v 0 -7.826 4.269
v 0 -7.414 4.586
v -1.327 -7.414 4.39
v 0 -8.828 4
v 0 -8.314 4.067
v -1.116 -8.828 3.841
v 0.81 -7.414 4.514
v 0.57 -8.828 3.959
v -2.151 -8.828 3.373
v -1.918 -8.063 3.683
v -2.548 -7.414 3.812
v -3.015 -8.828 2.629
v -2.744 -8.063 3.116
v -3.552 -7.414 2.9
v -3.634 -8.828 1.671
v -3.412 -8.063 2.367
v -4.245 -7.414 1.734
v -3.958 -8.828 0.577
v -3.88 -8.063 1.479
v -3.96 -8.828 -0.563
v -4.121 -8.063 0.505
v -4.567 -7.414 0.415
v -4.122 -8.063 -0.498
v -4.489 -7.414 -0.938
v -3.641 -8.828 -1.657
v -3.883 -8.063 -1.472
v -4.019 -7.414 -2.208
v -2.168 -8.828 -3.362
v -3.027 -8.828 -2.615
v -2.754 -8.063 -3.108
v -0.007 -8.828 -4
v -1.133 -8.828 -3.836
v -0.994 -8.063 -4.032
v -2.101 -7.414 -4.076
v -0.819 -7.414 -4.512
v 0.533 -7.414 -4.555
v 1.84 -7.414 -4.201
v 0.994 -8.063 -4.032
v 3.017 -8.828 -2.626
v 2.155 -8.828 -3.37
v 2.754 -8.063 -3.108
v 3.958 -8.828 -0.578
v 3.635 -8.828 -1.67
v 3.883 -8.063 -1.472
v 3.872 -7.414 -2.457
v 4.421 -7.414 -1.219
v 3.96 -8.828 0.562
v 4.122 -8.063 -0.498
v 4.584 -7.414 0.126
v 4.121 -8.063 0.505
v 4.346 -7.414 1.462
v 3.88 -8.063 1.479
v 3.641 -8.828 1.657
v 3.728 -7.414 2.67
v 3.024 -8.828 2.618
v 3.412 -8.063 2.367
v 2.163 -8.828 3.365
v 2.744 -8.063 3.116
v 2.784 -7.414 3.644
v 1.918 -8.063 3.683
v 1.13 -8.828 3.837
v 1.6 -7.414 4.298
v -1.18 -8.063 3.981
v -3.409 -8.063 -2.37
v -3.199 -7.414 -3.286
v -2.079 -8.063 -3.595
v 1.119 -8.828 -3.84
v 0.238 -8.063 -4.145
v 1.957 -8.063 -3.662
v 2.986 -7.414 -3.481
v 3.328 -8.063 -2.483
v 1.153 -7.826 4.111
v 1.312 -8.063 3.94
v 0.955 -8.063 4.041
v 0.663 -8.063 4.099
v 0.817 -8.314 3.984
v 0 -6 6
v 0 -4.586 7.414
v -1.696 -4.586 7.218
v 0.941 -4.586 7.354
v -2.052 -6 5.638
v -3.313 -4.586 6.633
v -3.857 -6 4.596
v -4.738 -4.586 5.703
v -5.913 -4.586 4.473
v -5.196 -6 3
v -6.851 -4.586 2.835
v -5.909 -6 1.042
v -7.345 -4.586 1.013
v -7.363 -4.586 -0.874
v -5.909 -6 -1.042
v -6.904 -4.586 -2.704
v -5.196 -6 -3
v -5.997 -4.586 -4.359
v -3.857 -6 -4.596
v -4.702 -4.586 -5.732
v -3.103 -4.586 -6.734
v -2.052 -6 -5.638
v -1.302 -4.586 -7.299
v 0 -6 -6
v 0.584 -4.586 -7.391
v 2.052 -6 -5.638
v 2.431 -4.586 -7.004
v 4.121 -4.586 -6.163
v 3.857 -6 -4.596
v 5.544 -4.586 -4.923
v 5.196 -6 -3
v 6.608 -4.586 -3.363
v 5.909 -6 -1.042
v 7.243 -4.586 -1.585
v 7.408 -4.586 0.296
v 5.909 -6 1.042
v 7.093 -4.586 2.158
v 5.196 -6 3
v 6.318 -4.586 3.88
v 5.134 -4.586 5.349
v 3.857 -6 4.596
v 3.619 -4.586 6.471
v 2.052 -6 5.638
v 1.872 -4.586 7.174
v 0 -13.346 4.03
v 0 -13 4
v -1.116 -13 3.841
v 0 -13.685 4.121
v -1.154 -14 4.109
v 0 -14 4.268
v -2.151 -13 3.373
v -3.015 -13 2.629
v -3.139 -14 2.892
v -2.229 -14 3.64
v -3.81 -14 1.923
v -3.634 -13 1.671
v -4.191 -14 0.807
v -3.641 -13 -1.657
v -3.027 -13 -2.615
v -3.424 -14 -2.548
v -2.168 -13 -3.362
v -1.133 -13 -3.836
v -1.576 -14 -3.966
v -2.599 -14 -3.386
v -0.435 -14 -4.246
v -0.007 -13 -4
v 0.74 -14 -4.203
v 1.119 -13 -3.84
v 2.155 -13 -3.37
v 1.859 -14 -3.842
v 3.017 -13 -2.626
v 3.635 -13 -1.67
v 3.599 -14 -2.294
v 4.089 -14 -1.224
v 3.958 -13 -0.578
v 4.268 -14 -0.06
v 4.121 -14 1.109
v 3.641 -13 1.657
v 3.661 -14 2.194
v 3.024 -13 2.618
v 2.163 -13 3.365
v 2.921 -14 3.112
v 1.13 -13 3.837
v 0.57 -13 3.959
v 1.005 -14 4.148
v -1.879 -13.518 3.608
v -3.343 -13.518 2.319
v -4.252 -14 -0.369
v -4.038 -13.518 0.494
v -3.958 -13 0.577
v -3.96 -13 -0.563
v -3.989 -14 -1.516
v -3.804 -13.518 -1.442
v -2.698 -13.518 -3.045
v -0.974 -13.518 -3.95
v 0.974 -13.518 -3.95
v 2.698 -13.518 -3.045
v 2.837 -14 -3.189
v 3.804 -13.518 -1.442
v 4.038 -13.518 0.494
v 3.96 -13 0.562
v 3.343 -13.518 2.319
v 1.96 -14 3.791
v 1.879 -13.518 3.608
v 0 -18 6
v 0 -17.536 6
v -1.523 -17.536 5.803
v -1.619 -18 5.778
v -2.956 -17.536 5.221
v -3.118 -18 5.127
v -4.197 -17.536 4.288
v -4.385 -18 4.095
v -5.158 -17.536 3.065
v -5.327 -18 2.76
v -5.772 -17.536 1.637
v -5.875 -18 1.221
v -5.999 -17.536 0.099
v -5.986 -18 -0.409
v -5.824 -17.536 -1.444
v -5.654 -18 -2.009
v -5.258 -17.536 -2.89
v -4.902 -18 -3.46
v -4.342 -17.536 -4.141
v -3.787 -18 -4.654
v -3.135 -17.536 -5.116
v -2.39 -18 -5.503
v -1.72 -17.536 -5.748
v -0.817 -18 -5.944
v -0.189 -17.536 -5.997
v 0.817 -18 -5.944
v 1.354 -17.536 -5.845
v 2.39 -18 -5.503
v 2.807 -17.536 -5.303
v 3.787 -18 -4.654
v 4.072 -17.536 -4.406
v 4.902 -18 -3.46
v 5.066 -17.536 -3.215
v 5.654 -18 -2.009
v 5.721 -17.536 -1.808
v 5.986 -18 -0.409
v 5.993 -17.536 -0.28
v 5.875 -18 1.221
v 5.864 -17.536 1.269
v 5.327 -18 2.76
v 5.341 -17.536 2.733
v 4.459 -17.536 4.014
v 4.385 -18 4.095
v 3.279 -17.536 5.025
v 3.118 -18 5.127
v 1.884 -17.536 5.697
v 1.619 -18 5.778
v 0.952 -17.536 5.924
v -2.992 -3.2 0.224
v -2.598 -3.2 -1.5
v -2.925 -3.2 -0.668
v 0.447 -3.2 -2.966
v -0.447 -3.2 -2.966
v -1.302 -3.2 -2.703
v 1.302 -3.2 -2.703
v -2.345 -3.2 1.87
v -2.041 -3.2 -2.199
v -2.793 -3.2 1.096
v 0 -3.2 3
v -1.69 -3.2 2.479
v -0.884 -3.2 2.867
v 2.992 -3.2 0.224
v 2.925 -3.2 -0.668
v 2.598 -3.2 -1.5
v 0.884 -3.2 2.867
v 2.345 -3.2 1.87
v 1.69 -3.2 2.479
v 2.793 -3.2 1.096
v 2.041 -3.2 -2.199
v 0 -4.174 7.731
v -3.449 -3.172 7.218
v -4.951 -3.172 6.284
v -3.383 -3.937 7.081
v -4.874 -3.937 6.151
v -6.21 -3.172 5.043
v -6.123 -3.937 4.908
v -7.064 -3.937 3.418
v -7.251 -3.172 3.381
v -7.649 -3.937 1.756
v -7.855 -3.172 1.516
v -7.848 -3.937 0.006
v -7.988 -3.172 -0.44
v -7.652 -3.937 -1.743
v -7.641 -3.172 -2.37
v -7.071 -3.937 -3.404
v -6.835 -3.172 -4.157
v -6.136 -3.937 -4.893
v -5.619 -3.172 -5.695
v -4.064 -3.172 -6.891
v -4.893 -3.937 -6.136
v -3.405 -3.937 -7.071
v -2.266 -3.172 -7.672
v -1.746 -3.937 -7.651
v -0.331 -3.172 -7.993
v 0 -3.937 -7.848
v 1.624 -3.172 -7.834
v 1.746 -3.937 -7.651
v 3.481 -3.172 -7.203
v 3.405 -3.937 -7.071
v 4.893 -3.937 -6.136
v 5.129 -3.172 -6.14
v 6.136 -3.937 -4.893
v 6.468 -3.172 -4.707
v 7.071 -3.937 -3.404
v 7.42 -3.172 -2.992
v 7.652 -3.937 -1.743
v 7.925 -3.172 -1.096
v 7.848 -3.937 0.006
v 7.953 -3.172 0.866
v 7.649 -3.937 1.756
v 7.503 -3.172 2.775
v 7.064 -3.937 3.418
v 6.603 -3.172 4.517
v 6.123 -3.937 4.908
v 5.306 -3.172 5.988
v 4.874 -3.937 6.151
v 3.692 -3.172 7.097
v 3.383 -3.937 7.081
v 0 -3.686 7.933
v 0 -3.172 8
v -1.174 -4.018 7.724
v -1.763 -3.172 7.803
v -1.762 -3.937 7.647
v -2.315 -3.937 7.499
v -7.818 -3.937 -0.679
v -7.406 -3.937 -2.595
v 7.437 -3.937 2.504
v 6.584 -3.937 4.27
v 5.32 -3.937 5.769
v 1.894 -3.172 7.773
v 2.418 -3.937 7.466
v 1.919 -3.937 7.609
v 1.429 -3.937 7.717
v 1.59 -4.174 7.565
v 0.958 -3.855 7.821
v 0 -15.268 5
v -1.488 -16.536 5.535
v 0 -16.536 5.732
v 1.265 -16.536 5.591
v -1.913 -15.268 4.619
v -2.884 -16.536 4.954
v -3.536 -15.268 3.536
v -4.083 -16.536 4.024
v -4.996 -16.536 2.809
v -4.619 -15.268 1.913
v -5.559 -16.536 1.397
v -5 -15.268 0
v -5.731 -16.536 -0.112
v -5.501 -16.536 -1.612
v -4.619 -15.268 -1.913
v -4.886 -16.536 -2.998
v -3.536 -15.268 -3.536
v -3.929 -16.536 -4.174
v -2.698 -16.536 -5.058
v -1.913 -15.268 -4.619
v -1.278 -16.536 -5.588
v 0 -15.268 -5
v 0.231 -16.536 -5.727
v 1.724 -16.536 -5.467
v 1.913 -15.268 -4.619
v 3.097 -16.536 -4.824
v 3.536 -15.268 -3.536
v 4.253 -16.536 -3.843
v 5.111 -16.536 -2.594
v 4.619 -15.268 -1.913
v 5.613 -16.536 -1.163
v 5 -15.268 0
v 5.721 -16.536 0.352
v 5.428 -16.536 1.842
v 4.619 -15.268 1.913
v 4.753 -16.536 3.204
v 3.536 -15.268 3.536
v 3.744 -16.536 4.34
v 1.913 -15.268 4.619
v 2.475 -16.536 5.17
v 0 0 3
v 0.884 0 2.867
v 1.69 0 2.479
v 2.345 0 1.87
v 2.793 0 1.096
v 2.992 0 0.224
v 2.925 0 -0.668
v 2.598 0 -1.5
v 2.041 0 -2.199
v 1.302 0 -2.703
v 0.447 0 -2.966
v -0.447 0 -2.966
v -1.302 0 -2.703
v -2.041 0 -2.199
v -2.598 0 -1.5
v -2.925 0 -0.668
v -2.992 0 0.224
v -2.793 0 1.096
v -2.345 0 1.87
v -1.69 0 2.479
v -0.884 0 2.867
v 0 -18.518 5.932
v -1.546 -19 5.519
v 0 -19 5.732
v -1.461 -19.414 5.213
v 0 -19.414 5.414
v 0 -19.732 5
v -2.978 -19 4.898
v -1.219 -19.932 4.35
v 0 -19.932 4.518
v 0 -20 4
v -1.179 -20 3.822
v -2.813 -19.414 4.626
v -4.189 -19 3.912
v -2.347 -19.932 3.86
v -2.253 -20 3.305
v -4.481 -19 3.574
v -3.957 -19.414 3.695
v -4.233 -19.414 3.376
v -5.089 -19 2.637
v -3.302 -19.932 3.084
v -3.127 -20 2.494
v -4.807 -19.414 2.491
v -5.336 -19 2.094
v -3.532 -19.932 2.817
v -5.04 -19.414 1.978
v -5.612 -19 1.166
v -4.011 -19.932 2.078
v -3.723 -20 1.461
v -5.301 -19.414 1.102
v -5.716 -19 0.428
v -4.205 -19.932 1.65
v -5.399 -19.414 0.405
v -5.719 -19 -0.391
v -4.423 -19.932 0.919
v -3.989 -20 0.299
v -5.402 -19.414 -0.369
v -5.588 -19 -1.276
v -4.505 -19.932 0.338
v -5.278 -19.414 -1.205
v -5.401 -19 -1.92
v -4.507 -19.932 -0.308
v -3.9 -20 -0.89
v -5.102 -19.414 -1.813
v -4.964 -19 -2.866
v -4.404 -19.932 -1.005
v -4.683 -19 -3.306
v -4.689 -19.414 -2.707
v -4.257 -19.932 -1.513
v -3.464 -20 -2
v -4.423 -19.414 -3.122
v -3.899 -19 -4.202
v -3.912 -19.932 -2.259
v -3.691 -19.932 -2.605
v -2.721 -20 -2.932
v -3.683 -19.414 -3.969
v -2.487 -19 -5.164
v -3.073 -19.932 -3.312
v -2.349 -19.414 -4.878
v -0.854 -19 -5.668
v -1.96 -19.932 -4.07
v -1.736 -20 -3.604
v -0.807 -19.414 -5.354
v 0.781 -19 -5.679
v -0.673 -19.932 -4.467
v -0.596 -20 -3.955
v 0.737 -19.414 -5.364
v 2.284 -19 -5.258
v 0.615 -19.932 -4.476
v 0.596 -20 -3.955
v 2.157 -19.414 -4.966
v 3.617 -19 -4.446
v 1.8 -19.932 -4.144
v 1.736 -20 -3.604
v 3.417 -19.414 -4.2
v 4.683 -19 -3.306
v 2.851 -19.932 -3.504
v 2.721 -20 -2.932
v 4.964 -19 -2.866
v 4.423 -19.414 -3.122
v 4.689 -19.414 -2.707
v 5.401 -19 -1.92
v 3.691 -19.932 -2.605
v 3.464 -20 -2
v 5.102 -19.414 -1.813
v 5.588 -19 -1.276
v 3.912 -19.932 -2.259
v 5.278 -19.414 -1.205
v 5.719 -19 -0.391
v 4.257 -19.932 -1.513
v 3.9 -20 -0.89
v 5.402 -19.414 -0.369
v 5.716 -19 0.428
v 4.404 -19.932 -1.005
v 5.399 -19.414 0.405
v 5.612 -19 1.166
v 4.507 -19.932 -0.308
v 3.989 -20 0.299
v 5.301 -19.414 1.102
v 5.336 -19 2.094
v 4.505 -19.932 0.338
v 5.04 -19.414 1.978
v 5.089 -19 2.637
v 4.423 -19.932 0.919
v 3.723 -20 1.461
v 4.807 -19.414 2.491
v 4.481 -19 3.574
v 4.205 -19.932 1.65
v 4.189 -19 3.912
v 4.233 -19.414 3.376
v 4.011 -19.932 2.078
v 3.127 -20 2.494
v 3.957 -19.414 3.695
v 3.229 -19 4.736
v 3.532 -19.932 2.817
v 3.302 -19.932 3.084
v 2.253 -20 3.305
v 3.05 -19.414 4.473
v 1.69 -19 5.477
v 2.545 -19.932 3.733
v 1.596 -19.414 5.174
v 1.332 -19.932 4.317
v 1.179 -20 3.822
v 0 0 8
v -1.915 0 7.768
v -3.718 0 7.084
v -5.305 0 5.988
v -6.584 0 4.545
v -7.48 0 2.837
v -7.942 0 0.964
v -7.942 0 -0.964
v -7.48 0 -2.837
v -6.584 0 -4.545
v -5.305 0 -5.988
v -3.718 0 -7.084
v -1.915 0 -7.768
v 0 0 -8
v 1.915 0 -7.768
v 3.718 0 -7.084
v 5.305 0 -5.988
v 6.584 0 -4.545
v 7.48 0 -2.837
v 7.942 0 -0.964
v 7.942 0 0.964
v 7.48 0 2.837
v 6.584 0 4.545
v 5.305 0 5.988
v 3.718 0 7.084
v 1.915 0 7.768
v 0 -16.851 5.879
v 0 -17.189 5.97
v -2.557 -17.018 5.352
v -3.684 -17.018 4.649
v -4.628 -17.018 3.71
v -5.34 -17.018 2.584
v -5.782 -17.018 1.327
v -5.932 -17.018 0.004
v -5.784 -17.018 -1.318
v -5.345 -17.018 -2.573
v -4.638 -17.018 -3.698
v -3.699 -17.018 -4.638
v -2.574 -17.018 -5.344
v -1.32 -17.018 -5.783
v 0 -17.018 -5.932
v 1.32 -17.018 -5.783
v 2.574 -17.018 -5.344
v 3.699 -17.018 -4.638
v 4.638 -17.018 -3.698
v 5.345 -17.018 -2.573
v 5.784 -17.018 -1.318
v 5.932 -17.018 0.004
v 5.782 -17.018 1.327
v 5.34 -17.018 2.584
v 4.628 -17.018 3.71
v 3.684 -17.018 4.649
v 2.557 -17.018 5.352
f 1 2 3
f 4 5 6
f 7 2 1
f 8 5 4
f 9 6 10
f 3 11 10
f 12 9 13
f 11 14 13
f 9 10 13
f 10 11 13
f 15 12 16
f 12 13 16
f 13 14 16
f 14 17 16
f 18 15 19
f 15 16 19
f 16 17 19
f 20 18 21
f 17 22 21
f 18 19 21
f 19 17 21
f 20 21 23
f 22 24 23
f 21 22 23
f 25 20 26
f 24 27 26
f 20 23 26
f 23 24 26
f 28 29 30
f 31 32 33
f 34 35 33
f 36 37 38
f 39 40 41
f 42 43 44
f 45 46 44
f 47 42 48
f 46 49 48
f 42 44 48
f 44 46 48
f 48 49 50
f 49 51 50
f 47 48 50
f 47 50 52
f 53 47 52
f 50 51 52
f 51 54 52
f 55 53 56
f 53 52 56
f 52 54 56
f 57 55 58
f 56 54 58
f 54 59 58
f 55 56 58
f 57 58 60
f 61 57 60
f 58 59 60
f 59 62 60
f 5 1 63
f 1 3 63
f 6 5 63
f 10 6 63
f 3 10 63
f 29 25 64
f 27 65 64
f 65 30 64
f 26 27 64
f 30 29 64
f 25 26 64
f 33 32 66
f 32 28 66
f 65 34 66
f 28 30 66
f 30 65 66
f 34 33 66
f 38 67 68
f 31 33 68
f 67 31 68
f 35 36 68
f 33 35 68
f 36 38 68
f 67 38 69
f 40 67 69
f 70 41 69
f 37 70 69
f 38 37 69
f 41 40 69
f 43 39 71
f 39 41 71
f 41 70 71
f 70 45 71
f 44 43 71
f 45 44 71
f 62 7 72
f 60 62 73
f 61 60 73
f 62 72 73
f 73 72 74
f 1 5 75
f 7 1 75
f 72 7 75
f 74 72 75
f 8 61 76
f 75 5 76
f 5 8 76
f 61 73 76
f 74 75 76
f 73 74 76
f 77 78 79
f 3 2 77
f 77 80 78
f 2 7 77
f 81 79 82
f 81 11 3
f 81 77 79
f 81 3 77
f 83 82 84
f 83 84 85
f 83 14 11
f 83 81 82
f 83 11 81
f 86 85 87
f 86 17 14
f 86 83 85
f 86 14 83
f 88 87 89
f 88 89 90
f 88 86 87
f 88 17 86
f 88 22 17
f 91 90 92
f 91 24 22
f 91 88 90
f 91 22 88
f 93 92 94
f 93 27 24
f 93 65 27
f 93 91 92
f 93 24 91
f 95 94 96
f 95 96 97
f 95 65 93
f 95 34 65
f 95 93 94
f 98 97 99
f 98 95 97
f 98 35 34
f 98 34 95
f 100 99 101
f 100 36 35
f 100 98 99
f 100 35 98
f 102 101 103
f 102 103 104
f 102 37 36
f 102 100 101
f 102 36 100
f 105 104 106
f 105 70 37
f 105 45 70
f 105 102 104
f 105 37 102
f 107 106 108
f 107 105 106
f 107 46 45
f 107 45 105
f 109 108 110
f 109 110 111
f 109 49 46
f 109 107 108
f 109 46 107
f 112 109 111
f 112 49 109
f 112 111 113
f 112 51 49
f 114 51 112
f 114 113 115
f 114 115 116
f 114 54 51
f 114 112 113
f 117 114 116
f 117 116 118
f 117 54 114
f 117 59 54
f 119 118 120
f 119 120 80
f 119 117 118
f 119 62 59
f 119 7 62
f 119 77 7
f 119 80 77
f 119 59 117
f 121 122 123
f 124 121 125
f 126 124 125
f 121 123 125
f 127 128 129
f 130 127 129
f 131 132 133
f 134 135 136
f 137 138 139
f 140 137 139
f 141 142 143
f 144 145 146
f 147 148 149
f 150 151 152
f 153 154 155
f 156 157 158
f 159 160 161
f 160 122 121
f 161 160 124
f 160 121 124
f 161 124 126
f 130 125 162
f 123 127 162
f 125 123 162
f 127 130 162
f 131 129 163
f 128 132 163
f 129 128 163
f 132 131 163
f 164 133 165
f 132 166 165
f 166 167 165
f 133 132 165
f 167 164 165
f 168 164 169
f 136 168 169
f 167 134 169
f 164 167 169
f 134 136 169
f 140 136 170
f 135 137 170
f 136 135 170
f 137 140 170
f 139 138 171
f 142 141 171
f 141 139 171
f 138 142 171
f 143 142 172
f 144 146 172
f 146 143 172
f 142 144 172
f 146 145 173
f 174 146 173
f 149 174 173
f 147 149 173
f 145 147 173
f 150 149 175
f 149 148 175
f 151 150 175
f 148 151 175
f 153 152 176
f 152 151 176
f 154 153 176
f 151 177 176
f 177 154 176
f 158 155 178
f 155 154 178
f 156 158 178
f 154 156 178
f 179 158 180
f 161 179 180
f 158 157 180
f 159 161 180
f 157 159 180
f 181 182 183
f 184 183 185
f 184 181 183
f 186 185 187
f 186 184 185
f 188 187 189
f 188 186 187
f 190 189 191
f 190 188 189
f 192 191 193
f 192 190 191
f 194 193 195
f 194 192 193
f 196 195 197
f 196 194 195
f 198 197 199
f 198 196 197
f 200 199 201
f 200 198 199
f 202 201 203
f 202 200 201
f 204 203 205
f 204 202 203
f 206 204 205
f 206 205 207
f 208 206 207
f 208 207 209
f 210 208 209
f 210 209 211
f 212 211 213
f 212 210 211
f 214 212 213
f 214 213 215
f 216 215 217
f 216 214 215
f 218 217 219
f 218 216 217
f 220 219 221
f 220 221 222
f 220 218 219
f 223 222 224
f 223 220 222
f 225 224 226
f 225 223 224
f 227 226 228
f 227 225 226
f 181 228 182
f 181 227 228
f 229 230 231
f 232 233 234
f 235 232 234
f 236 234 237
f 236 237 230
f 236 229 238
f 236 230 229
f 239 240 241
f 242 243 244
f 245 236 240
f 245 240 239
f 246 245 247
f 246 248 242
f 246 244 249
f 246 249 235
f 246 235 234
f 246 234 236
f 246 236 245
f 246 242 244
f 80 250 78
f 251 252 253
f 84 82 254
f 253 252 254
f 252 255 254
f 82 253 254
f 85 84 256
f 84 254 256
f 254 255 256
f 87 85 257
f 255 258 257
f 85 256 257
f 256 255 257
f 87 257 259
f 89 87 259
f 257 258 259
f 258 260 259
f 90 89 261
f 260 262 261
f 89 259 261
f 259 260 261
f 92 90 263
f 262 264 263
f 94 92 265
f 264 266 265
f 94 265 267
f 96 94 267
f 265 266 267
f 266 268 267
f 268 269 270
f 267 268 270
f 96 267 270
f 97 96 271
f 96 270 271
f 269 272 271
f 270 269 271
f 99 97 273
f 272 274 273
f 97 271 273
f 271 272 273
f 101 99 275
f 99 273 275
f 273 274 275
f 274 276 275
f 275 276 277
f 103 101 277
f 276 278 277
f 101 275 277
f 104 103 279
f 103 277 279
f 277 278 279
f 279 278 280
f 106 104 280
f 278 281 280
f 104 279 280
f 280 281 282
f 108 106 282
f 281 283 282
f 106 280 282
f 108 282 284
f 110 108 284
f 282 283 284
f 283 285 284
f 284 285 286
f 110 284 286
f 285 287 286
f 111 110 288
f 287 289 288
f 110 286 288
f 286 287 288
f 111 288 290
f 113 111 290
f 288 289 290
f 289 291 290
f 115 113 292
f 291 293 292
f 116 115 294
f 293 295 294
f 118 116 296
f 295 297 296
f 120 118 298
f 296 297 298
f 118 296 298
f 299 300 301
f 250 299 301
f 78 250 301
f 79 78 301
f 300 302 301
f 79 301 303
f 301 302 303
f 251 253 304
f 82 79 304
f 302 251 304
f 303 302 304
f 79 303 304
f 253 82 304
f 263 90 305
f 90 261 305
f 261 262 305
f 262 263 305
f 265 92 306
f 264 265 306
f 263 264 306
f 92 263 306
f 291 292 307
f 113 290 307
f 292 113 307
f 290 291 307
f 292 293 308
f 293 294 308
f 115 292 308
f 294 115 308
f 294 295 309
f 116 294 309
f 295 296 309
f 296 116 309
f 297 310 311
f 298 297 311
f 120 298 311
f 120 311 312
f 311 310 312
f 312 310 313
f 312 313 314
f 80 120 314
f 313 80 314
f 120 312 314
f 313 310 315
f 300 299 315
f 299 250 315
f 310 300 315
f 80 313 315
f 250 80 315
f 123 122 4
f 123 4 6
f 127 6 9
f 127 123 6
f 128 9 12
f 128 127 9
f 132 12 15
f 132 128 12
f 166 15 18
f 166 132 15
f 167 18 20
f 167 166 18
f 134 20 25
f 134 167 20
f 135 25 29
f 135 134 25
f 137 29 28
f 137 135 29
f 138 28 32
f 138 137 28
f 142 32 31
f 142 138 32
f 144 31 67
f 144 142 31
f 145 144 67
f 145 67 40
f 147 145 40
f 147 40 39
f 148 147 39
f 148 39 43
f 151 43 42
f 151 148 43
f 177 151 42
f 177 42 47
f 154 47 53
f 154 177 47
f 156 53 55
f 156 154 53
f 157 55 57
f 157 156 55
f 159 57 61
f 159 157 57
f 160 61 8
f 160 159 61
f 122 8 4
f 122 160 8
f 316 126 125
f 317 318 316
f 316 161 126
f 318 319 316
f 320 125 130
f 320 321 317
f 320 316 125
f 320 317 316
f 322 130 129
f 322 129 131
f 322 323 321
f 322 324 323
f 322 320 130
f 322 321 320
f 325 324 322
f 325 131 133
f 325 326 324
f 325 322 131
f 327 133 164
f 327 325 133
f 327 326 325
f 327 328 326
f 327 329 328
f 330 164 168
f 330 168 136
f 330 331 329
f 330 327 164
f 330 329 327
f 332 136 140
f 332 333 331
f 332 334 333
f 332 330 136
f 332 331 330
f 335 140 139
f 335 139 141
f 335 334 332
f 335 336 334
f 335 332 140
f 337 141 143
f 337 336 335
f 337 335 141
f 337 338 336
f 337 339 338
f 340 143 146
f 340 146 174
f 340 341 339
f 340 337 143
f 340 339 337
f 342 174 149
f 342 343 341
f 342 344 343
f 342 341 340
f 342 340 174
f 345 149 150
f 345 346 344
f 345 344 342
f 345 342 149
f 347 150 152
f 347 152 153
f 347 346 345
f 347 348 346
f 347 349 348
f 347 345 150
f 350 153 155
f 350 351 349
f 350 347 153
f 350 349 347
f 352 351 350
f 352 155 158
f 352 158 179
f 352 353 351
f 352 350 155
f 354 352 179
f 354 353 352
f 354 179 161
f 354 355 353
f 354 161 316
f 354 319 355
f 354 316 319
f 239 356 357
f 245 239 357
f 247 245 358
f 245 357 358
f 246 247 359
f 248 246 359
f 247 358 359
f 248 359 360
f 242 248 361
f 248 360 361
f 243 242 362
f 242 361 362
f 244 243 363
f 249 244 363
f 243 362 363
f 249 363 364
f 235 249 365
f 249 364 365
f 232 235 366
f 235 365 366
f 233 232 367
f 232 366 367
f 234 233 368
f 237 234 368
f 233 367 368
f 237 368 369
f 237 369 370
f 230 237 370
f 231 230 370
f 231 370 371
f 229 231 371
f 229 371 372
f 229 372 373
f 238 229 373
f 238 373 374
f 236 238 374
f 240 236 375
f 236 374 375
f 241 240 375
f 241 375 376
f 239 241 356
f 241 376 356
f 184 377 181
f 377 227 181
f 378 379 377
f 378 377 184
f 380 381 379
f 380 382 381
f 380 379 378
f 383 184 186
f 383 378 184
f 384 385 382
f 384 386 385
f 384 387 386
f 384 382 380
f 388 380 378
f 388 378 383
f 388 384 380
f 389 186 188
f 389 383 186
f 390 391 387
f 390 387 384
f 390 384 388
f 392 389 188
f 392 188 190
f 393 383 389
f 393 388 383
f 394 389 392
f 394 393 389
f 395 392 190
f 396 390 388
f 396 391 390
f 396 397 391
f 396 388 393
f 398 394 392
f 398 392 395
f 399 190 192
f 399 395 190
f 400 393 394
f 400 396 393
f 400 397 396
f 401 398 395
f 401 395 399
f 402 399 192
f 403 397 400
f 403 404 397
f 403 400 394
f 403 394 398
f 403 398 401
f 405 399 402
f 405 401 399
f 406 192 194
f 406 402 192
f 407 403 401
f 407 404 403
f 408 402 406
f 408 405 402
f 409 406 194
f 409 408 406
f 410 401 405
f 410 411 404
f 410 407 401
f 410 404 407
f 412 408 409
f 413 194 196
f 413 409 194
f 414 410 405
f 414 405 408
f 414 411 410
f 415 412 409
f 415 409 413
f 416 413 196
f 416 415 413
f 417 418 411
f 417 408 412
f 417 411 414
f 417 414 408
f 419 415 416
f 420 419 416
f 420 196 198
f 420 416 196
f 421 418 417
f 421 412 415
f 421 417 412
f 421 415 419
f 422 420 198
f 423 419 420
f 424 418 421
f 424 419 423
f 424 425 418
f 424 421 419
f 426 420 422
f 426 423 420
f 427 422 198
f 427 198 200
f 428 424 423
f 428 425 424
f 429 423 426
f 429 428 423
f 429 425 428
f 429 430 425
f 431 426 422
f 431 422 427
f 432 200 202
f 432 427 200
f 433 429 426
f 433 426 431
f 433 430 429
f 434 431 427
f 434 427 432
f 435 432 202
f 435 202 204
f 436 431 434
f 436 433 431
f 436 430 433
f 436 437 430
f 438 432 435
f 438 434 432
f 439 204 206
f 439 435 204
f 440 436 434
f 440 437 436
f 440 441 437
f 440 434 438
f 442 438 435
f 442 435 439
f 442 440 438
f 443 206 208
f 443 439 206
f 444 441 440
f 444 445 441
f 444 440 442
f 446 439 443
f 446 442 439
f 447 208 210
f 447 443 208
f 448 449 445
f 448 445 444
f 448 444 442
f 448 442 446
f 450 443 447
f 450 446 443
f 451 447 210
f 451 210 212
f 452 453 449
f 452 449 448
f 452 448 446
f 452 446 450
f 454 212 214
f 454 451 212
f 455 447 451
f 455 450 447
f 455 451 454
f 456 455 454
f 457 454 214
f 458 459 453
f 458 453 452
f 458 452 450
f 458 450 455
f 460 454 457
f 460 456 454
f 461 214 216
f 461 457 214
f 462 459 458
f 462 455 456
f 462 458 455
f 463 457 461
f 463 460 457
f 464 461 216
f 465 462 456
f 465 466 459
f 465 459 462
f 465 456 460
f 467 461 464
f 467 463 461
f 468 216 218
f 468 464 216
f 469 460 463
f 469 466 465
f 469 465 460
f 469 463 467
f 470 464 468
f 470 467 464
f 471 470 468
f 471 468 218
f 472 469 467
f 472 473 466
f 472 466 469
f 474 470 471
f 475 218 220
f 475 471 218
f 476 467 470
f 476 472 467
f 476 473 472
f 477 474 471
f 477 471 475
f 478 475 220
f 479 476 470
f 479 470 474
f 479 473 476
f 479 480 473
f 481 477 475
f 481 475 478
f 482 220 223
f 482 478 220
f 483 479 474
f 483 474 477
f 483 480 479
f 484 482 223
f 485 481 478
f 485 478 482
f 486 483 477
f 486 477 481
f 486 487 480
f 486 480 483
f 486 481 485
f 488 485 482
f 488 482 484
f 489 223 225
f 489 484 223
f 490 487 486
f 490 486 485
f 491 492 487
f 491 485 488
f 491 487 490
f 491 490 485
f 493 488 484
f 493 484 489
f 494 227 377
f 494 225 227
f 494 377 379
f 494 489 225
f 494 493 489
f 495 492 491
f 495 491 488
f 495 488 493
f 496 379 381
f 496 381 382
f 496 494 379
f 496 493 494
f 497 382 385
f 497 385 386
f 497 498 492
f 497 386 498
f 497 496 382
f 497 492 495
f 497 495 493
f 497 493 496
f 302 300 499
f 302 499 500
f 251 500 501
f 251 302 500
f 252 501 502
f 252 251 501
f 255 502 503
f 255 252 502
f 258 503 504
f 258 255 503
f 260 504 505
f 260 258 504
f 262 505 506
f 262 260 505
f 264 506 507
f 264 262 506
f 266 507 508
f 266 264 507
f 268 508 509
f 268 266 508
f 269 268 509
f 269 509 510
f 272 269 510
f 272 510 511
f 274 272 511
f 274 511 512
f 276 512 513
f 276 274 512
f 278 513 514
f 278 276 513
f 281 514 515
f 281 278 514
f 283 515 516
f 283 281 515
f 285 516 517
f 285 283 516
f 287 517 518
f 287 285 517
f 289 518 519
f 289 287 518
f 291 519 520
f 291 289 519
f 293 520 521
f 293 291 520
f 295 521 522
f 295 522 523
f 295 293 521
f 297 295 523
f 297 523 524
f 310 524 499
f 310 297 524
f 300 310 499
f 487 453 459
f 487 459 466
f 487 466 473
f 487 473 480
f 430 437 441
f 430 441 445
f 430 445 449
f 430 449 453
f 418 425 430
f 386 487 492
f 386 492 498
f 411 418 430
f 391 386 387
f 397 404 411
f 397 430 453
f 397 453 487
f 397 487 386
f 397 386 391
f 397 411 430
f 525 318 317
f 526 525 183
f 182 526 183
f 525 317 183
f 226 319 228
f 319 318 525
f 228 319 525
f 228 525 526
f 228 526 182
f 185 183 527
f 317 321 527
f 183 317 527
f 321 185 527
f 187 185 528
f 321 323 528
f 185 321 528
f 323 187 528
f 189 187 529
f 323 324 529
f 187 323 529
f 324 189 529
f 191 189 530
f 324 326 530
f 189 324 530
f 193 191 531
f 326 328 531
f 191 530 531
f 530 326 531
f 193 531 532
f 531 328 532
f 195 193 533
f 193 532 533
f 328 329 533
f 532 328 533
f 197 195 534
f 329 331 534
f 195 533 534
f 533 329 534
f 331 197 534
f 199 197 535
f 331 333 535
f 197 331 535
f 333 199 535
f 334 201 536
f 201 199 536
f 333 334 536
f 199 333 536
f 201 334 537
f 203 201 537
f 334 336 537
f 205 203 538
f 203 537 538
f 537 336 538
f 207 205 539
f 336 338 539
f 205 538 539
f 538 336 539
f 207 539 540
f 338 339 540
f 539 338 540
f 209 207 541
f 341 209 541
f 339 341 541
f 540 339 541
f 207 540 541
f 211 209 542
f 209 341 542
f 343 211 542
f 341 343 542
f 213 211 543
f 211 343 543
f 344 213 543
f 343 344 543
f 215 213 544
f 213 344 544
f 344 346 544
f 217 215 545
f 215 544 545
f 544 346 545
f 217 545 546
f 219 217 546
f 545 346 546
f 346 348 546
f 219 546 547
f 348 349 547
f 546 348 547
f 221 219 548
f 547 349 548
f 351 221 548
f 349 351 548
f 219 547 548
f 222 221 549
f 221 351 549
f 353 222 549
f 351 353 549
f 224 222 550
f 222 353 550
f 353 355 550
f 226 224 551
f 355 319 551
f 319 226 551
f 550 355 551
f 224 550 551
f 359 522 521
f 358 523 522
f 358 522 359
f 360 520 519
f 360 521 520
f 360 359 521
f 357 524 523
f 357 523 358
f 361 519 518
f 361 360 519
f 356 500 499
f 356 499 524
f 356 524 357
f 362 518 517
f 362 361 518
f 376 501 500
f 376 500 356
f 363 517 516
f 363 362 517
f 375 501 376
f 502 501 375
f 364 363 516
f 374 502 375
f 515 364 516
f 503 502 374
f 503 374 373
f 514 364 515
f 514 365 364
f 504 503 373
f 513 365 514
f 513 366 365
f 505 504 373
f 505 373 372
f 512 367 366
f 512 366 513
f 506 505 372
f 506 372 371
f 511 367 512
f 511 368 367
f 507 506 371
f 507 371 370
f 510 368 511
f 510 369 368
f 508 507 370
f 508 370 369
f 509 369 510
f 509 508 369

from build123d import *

# Parameters (mm, degrees)
FILLET1_R          = 2
SKETCH2_R          = 3
CUT_EXTRUDE1_DEPTH = 3.2


with BuildPart() as part:
    # Sketch1 → Revolve1 (revolve)
    with BuildSketch(Plane.XY, mode=Mode.PRIVATE) as revolve1_sk:
        Polygon((0, 0), (8, 0), (8, -4), (4, -8), (4, -13.535898385), (6, -17), (6, -20), (0, -20), align=None)
    revolve(revolve1_sk.sketch.rotate(Axis((0, 48.586008243, 0), (0, -1, 0)), 90), axis=Axis((0, 48.586008243, 0), (0, -1, 0)))

    # Fillet1
    fillet1_edges = [part.edges().sort_by_distance(p)[0] for p in [
        (0, -20, -6),
        (0, -17, -6),
        (0, -13.535898385, -4),
        (0, -8, -4),
        (0, -4, -8),
    ]]
    fillet(fillet1_edges, radius=FILLET1_R)

    # Sketch2 → Cut-Extrude1 (cut)
    with BuildSketch(Plane(origin=(0, 0, 0), x_dir=(1, 0, 0), z_dir=(0, 1, 0))):
        with Locations(Location((0, 0, 0), (0, 0, 270))):
            Circle(SKETCH2_R)
    extrude(amount=-CUT_EXTRUDE1_DEPTH, mode=Mode.SUBTRACT)


solid = part.part
